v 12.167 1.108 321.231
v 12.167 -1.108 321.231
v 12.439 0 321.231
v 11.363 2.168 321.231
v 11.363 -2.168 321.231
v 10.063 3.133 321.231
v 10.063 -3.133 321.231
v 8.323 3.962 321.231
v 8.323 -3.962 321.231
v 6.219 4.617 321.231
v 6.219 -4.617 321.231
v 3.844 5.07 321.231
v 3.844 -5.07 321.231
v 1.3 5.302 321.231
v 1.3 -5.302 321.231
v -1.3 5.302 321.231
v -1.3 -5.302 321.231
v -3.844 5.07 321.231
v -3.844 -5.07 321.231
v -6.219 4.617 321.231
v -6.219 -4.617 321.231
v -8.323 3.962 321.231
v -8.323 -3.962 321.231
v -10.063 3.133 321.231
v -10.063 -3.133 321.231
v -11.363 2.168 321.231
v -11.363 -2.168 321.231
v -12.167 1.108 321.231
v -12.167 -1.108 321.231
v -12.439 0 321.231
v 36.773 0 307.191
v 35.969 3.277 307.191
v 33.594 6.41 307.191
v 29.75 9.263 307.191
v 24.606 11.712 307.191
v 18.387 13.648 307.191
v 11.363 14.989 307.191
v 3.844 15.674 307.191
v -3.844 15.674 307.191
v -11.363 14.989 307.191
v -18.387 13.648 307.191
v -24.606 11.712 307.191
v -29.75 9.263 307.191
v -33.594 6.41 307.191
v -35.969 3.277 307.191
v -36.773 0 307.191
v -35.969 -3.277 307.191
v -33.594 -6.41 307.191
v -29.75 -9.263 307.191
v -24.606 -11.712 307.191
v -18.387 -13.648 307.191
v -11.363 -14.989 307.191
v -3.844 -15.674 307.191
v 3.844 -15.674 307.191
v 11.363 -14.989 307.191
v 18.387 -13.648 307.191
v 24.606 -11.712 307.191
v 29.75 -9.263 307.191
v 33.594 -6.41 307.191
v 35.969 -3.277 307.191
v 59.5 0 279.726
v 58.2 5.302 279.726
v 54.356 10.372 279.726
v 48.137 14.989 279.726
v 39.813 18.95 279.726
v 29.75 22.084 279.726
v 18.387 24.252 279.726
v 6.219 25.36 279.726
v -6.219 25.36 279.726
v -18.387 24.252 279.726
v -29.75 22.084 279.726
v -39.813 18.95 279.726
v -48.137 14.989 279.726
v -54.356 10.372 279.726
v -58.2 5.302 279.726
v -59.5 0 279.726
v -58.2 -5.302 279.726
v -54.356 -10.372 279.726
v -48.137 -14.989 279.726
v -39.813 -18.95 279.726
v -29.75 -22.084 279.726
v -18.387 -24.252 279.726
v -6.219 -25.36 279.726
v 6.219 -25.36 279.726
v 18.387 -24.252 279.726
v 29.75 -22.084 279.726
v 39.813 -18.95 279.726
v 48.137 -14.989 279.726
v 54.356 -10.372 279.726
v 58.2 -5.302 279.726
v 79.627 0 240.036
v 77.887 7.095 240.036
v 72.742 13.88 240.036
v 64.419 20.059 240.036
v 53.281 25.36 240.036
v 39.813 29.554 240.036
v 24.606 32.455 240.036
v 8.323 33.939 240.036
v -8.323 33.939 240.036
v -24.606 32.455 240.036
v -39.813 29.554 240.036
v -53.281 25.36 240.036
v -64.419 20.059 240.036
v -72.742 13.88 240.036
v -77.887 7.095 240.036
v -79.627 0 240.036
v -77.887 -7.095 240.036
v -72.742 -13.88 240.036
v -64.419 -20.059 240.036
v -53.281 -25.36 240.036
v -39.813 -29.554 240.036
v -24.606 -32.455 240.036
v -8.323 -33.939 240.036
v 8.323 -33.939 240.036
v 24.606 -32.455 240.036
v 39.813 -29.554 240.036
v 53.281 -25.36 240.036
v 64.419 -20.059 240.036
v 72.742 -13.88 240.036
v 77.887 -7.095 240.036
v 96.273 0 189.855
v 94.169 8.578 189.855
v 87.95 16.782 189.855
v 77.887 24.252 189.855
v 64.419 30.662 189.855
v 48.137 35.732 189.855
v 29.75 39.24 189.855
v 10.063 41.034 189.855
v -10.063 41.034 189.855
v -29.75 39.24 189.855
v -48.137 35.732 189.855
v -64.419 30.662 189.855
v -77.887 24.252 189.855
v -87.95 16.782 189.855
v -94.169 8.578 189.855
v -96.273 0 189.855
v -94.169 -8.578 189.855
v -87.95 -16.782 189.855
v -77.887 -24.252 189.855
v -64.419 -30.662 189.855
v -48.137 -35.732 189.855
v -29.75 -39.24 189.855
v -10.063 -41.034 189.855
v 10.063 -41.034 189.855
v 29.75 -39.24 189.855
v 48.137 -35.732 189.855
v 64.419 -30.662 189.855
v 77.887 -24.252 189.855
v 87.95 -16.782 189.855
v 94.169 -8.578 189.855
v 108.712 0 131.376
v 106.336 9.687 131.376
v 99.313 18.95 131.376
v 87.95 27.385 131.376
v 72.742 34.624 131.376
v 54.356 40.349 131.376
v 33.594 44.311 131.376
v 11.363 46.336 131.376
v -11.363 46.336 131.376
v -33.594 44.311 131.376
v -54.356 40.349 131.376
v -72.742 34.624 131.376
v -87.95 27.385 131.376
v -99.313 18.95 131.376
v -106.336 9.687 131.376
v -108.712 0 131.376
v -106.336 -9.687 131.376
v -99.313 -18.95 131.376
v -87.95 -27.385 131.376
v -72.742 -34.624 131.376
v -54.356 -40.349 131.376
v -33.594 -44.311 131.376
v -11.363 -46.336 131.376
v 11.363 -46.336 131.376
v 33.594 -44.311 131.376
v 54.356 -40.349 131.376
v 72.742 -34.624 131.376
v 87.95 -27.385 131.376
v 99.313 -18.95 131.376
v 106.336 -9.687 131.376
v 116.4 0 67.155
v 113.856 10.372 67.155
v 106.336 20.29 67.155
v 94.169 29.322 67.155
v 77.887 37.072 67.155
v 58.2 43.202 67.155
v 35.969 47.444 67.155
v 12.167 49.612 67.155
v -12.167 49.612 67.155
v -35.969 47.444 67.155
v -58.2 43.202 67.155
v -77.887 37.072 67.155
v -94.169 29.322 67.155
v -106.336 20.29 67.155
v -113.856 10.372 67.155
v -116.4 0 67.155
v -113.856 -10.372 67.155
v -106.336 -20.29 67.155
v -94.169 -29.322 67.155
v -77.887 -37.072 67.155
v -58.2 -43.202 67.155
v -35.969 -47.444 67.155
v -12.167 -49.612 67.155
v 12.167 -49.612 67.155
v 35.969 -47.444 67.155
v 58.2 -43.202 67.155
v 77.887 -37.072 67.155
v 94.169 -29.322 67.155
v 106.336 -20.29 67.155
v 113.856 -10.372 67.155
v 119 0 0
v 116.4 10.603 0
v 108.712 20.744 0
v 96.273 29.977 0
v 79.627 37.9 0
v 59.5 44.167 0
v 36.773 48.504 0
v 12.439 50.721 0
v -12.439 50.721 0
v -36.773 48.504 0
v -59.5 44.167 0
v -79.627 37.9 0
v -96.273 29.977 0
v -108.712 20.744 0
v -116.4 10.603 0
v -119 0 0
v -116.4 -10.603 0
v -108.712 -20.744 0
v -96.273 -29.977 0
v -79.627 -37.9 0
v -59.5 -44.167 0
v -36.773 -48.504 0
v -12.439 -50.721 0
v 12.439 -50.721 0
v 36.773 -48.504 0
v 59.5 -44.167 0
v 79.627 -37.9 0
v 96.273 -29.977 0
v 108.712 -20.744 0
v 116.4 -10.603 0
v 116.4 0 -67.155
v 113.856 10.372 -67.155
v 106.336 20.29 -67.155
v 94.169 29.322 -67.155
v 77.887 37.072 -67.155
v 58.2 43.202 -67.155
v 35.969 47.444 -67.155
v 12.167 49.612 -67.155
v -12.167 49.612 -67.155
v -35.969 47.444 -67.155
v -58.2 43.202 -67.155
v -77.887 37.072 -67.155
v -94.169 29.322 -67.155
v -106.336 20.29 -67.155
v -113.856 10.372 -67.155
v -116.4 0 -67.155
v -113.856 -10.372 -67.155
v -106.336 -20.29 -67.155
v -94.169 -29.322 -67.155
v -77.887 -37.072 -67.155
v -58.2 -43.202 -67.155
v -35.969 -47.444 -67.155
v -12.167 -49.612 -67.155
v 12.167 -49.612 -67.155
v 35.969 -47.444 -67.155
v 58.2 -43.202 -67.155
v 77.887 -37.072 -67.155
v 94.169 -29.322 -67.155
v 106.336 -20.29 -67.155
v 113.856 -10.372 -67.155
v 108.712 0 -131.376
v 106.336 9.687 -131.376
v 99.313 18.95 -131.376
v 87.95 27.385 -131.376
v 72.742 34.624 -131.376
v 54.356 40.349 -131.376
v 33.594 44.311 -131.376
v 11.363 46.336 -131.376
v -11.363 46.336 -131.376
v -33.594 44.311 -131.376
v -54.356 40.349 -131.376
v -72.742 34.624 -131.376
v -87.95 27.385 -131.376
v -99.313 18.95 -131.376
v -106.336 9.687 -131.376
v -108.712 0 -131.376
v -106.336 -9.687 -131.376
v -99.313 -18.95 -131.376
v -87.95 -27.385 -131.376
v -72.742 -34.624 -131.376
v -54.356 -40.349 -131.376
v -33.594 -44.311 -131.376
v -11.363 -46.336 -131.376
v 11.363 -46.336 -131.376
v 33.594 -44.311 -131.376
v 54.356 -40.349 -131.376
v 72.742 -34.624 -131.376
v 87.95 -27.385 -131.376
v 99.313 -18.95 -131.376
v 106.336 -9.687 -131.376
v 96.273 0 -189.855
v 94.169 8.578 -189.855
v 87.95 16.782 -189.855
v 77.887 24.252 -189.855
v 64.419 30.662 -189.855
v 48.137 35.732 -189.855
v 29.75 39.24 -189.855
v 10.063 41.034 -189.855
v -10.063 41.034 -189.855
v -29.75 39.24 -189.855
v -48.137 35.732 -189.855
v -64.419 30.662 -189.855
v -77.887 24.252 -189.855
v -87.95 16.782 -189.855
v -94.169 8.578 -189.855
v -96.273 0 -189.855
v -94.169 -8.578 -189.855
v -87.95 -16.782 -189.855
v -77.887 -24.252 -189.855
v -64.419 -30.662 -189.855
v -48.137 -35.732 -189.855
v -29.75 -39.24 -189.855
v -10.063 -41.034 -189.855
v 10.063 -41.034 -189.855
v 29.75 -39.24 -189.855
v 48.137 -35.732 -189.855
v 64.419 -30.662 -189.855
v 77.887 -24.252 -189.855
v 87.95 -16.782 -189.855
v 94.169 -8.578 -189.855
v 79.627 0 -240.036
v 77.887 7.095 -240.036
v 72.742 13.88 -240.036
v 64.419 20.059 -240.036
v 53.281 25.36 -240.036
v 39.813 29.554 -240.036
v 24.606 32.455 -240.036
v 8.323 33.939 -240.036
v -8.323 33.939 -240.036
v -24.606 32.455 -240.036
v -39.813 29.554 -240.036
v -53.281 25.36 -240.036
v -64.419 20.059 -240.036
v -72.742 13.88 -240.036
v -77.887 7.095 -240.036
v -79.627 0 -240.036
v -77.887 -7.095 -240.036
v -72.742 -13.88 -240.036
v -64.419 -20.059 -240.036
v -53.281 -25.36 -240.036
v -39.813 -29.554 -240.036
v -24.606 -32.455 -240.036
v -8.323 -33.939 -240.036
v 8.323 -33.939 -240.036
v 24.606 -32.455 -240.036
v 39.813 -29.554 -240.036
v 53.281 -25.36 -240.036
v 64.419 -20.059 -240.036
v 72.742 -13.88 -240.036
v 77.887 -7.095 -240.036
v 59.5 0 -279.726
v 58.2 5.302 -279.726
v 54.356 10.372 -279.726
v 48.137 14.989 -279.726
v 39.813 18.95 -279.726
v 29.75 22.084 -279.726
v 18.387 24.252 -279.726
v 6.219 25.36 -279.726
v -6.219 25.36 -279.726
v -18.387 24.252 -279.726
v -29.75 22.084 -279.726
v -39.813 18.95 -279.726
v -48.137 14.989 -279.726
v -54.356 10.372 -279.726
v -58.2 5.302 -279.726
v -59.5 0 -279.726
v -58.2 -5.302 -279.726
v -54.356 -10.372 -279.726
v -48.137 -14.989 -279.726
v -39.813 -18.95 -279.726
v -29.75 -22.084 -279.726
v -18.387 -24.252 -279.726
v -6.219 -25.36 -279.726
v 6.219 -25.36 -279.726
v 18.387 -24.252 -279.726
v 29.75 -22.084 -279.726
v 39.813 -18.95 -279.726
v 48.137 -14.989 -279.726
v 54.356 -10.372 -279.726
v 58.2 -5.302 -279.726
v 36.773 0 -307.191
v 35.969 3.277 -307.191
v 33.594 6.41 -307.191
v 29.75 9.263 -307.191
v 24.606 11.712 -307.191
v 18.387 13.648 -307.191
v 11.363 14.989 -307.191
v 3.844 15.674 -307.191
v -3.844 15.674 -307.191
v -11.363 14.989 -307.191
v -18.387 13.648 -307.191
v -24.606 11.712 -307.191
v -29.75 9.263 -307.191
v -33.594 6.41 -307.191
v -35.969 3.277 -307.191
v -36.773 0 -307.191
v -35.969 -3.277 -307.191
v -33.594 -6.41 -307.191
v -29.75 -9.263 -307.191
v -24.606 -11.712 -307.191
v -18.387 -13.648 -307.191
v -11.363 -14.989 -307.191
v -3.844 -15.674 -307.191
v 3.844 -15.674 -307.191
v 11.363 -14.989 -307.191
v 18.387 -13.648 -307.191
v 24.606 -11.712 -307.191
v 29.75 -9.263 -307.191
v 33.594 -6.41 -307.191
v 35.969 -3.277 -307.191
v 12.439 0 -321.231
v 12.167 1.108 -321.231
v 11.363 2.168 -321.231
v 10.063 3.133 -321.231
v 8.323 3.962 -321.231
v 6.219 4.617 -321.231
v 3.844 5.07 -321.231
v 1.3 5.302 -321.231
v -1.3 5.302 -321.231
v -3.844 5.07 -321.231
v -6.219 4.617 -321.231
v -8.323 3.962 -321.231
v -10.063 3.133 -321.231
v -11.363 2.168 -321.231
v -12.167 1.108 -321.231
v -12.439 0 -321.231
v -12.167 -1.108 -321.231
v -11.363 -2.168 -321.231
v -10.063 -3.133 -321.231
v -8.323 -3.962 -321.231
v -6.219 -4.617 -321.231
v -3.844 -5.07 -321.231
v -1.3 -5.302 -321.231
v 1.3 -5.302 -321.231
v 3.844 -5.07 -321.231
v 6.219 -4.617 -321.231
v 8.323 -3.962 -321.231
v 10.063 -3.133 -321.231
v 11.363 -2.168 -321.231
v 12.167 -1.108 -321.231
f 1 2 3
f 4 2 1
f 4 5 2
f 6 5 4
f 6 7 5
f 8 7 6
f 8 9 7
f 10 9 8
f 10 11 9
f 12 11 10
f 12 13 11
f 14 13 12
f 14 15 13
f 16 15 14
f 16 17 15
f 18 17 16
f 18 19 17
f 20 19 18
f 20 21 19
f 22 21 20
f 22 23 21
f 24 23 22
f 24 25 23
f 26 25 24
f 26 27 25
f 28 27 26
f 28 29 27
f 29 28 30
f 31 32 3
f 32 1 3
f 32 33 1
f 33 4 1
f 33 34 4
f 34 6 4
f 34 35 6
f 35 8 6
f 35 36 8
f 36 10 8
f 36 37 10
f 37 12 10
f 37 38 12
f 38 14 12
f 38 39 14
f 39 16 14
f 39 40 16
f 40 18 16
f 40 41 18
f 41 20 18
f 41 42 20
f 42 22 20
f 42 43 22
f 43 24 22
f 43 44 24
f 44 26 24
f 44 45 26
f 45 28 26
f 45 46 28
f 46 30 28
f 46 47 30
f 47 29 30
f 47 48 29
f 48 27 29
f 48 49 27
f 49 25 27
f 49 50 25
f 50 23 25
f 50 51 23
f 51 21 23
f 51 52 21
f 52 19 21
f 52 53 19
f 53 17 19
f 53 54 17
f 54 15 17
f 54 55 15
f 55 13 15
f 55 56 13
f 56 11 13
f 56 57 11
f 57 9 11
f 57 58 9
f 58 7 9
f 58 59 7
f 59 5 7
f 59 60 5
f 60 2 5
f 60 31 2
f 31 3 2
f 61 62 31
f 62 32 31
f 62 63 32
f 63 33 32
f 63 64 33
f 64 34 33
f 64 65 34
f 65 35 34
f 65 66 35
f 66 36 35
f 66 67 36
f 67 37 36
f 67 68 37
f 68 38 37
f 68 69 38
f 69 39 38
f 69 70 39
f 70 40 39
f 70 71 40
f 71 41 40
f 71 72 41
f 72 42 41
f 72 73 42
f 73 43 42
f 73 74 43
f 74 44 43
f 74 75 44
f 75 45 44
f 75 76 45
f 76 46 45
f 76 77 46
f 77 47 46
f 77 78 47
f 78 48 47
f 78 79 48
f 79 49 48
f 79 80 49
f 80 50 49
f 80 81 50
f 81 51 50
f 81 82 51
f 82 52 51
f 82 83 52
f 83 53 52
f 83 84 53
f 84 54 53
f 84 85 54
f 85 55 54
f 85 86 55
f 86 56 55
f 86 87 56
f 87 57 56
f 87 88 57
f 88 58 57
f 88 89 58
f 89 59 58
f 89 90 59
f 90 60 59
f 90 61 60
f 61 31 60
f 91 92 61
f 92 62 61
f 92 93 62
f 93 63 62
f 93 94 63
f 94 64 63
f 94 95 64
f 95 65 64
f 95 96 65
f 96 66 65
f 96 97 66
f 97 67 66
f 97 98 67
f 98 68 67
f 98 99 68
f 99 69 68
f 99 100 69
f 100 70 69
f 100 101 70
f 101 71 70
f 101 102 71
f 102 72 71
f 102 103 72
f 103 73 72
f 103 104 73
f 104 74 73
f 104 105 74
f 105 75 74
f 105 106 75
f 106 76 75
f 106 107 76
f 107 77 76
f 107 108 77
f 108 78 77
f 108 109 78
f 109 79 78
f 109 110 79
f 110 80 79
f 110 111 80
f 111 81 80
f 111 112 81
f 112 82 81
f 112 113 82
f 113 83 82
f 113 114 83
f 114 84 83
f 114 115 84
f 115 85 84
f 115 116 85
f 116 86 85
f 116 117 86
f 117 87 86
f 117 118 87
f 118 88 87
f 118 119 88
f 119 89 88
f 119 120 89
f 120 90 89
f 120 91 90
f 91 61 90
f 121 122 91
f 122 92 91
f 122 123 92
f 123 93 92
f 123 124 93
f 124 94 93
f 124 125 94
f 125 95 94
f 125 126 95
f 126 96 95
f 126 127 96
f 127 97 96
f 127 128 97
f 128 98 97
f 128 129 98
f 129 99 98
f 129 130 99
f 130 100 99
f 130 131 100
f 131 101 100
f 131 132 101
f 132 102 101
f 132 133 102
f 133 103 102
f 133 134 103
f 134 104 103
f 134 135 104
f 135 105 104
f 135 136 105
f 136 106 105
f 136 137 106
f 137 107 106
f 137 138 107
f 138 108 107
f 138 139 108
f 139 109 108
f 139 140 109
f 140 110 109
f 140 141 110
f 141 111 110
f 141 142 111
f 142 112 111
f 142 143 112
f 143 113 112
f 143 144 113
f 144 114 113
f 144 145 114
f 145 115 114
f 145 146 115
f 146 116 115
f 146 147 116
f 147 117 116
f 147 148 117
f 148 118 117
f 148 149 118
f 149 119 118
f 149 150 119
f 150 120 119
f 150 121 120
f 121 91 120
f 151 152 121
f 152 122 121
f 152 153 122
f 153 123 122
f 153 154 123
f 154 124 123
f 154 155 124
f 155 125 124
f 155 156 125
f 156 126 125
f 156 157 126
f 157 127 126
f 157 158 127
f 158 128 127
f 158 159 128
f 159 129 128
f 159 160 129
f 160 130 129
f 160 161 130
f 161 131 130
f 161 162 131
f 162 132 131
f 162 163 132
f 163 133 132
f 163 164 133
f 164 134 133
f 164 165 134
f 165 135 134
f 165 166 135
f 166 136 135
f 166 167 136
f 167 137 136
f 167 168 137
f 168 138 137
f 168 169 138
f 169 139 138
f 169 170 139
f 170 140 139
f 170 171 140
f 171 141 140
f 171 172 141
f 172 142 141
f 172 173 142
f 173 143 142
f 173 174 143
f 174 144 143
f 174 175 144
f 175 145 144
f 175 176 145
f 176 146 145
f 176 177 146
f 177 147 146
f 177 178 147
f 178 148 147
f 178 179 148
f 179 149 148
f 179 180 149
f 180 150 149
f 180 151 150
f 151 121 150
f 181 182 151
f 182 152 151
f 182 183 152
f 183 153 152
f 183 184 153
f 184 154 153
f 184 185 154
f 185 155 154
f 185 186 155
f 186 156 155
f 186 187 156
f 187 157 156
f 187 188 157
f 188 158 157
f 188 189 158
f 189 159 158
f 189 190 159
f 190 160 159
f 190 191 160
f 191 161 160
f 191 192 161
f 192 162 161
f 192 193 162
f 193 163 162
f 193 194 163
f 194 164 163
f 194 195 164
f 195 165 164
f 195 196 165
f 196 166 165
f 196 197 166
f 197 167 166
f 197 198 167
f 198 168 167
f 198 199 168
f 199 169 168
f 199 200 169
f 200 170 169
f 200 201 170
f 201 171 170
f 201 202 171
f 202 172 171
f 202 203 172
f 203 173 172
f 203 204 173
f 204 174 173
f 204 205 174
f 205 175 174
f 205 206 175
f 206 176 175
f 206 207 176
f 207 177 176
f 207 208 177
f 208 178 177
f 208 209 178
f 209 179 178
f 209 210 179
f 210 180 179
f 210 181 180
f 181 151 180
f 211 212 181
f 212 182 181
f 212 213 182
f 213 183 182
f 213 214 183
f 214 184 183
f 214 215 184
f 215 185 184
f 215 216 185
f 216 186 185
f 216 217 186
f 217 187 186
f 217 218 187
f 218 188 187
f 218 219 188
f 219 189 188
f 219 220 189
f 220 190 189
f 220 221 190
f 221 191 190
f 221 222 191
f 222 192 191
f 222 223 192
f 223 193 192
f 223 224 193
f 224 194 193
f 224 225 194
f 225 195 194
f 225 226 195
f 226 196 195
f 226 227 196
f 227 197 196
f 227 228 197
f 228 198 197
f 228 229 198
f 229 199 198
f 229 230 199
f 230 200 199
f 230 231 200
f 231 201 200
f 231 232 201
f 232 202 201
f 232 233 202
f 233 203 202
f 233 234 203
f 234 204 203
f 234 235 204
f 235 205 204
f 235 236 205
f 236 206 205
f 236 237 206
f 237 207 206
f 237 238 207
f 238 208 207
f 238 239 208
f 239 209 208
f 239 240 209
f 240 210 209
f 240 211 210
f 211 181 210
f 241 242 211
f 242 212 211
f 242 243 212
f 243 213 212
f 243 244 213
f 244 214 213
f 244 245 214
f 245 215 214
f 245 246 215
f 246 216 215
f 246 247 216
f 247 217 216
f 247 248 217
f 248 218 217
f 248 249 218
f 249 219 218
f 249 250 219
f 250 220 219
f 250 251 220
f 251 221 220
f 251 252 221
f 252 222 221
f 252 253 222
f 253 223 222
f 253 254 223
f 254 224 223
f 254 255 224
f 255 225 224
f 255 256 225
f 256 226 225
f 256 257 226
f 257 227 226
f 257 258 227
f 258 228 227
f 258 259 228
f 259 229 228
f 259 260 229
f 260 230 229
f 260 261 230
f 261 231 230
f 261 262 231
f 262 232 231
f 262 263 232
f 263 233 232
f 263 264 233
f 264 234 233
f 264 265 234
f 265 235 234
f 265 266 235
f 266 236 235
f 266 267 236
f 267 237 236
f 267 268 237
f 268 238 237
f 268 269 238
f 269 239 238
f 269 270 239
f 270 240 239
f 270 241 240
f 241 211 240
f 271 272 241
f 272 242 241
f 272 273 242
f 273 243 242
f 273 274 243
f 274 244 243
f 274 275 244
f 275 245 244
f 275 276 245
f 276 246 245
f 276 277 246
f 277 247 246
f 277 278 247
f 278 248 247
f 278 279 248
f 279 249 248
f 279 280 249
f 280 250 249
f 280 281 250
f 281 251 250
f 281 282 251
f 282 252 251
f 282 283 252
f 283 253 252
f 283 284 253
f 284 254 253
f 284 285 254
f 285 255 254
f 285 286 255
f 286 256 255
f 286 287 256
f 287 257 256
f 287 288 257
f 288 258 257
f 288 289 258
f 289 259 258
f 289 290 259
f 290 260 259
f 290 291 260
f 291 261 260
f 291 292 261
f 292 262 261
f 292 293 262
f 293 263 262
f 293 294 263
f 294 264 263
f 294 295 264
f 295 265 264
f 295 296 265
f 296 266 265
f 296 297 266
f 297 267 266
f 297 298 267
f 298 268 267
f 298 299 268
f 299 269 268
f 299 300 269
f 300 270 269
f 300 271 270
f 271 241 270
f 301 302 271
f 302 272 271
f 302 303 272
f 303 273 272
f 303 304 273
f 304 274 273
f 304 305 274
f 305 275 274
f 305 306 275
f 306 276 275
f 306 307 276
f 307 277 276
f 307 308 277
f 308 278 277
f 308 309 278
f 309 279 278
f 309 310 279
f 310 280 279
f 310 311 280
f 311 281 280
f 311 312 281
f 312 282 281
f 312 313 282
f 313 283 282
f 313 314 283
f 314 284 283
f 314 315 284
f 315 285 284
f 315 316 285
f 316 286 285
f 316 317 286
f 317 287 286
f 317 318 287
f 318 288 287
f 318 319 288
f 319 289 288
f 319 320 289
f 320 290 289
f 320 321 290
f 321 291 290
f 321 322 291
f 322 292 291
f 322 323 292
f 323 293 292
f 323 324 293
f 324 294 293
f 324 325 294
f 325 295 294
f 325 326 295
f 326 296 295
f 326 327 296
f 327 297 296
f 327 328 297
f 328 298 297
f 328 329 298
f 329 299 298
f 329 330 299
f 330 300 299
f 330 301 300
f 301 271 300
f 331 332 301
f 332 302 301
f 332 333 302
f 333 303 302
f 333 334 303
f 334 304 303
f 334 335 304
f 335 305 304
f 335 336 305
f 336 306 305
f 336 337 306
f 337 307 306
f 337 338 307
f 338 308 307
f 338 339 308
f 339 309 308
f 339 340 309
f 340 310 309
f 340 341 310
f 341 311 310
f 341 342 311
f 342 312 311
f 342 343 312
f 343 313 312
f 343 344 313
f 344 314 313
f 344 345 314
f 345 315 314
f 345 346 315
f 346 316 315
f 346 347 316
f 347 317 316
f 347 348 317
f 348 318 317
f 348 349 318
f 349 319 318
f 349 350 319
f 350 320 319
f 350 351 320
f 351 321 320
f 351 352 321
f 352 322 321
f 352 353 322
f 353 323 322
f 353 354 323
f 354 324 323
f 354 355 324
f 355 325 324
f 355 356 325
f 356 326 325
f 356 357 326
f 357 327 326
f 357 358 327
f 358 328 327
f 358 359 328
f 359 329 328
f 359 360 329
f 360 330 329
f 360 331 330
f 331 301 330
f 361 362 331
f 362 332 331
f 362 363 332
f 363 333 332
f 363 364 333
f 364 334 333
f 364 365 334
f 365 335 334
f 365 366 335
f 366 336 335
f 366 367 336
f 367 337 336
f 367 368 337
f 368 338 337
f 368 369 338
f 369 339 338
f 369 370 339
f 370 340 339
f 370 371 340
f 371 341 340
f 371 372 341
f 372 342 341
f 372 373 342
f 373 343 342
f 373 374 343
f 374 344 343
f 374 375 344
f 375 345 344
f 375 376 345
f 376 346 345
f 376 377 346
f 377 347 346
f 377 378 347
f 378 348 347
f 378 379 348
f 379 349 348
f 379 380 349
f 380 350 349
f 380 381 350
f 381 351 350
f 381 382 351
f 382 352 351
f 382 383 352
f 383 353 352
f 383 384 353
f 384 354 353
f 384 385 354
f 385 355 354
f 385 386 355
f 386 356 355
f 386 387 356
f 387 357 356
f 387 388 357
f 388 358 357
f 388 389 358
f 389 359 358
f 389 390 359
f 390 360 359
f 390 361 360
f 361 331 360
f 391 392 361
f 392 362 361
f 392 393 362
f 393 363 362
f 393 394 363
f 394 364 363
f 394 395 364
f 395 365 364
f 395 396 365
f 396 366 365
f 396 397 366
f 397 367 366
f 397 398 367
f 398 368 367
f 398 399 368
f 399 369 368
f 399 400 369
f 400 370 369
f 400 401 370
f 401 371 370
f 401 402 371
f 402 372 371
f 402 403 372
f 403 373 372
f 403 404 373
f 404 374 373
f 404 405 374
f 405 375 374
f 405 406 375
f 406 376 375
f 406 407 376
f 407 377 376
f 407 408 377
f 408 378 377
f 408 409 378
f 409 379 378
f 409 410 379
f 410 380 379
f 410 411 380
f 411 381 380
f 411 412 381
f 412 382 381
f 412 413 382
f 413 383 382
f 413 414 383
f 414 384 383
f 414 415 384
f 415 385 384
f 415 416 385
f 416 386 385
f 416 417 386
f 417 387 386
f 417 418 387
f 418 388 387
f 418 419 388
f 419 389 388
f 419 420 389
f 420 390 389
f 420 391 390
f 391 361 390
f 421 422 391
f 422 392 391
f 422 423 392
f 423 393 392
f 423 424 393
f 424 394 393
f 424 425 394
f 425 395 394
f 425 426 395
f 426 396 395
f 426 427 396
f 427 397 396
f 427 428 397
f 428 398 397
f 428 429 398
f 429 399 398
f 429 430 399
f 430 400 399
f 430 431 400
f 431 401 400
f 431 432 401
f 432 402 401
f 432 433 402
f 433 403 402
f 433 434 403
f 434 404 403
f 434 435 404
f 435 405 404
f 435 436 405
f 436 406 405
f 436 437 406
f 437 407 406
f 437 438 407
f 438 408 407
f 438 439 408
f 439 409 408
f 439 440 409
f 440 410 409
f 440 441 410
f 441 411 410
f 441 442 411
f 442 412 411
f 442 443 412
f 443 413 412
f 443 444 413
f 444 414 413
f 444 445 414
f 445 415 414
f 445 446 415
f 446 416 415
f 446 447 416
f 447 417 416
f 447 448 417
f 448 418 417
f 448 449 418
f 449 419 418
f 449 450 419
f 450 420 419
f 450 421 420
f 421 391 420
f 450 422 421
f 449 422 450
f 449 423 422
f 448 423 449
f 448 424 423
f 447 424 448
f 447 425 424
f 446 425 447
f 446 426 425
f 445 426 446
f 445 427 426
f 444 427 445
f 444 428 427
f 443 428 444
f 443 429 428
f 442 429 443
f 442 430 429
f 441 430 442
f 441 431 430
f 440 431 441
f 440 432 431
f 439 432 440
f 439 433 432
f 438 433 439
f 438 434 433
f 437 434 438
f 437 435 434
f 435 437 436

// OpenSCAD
// Generated by SolidPython 1.0.1 on 2020-07-29 00:46:47


scale(v = [7, 3, 19]) {
	sphere(r = 17);
}
/***********************************************
*********      SolidPython code:      **********
************************************************
 
# import packages: SolidPython
from solid import *
from solid.utils import *
from itertools import chain, combinations, permutations


class Resize:

    def __init__(self, scad_file):
        self.scad_file = scad_file
        #self.scad_file = import_scad(scad_file)
        # cone/cylinder param:
        self.r1 = 0
        self.r2 = 0
        self.h = 0
        # rectangular prism param:
        self.w = 0
        self.l = 0
        # ellipse param:
        self.r = 0

    # import OpenScad code (file name corresponds to shape)


    # classify shape + parameters
    def assign(self, param1, param2, param3):
        if self.scad_file == 'cone.scad':
            self.r1 = param1
            self.r2 = param2
            self.h = param3
        elif self.scad_file == 'cylinder.scad':
            self.r1 = param1
            self.r2 = param2
            self.h = param3
        elif self.scad_file == 'rectangularPrism.scad':
            self.h = param1
            self.l = param2
            self.w = param3
        else:
            self.r = param1
            self.h = param2

    # resize parameters
    def iterate(self):
        x = range(3, 20, 2)
        i = 1
        if self.scad_file == 'cone.scad':
            tempList = list(permutations(x, 2))
            for temp in tempList:
                param1 = temp[0]
                param2 = temp[1]
                filepath = 'produced_scad_files/' + 'cone' + str(param1) + '_' + str(param2) + '_' + '.scad'
                scad_render_to_file(cylinder(h=param1, r1=param2, r2=0), filepath)

        elif self.scad_file == 'cylinder.scad':
            tempList = list(permutations(x, 3))
            for temp in tempList:
                param1 = temp[0]
                param2 = temp[1]
                filepath = 'produced_scad_files/' + 'cylinder' + str(param1) + '_' + str(param2) + '_' + '.scad'
                scad_render_to_file(cylinder(h=param1, r1=param2, r2=param2), filepath)

        elif self.scad_file == 'rectangularPrism.scad':
            tempList = list(permutations(x, 3))
            for temp in tempList:
                param1 = temp[0]
                param2 = temp[1]
                param3 = temp[2]
                filepath = 'produced_scad_files/' + 'rectangularPrism' + str(param1) + '_' + str(param2) + '_' + str(
                    param3) + '.scad'
                scad_render_to_file(cube(size=(param1, param2, param3)), filepath)

        elif self.scad_file == 'ellipse.scad':
            tempList = list(permutations(x, 4))
            for temp in tempList:
                param1 = temp[0]
                param2 = temp[1]
                param3 = temp[2]
                param4 = temp[3]
                filepath = 'produced_scad_files/' + 'ellipse' + str(param1) + '_' + str(param2) + '_' + str(param3) + '_' + str(param4) + '.scad'
                scad_render_to_file(scale([param1, param2, param3])(sphere(r=param4)), filepath)

    def render_to_scadfile(self):
        scad_render_to_file(scad, 'example.scad') 
 
************************************************/
